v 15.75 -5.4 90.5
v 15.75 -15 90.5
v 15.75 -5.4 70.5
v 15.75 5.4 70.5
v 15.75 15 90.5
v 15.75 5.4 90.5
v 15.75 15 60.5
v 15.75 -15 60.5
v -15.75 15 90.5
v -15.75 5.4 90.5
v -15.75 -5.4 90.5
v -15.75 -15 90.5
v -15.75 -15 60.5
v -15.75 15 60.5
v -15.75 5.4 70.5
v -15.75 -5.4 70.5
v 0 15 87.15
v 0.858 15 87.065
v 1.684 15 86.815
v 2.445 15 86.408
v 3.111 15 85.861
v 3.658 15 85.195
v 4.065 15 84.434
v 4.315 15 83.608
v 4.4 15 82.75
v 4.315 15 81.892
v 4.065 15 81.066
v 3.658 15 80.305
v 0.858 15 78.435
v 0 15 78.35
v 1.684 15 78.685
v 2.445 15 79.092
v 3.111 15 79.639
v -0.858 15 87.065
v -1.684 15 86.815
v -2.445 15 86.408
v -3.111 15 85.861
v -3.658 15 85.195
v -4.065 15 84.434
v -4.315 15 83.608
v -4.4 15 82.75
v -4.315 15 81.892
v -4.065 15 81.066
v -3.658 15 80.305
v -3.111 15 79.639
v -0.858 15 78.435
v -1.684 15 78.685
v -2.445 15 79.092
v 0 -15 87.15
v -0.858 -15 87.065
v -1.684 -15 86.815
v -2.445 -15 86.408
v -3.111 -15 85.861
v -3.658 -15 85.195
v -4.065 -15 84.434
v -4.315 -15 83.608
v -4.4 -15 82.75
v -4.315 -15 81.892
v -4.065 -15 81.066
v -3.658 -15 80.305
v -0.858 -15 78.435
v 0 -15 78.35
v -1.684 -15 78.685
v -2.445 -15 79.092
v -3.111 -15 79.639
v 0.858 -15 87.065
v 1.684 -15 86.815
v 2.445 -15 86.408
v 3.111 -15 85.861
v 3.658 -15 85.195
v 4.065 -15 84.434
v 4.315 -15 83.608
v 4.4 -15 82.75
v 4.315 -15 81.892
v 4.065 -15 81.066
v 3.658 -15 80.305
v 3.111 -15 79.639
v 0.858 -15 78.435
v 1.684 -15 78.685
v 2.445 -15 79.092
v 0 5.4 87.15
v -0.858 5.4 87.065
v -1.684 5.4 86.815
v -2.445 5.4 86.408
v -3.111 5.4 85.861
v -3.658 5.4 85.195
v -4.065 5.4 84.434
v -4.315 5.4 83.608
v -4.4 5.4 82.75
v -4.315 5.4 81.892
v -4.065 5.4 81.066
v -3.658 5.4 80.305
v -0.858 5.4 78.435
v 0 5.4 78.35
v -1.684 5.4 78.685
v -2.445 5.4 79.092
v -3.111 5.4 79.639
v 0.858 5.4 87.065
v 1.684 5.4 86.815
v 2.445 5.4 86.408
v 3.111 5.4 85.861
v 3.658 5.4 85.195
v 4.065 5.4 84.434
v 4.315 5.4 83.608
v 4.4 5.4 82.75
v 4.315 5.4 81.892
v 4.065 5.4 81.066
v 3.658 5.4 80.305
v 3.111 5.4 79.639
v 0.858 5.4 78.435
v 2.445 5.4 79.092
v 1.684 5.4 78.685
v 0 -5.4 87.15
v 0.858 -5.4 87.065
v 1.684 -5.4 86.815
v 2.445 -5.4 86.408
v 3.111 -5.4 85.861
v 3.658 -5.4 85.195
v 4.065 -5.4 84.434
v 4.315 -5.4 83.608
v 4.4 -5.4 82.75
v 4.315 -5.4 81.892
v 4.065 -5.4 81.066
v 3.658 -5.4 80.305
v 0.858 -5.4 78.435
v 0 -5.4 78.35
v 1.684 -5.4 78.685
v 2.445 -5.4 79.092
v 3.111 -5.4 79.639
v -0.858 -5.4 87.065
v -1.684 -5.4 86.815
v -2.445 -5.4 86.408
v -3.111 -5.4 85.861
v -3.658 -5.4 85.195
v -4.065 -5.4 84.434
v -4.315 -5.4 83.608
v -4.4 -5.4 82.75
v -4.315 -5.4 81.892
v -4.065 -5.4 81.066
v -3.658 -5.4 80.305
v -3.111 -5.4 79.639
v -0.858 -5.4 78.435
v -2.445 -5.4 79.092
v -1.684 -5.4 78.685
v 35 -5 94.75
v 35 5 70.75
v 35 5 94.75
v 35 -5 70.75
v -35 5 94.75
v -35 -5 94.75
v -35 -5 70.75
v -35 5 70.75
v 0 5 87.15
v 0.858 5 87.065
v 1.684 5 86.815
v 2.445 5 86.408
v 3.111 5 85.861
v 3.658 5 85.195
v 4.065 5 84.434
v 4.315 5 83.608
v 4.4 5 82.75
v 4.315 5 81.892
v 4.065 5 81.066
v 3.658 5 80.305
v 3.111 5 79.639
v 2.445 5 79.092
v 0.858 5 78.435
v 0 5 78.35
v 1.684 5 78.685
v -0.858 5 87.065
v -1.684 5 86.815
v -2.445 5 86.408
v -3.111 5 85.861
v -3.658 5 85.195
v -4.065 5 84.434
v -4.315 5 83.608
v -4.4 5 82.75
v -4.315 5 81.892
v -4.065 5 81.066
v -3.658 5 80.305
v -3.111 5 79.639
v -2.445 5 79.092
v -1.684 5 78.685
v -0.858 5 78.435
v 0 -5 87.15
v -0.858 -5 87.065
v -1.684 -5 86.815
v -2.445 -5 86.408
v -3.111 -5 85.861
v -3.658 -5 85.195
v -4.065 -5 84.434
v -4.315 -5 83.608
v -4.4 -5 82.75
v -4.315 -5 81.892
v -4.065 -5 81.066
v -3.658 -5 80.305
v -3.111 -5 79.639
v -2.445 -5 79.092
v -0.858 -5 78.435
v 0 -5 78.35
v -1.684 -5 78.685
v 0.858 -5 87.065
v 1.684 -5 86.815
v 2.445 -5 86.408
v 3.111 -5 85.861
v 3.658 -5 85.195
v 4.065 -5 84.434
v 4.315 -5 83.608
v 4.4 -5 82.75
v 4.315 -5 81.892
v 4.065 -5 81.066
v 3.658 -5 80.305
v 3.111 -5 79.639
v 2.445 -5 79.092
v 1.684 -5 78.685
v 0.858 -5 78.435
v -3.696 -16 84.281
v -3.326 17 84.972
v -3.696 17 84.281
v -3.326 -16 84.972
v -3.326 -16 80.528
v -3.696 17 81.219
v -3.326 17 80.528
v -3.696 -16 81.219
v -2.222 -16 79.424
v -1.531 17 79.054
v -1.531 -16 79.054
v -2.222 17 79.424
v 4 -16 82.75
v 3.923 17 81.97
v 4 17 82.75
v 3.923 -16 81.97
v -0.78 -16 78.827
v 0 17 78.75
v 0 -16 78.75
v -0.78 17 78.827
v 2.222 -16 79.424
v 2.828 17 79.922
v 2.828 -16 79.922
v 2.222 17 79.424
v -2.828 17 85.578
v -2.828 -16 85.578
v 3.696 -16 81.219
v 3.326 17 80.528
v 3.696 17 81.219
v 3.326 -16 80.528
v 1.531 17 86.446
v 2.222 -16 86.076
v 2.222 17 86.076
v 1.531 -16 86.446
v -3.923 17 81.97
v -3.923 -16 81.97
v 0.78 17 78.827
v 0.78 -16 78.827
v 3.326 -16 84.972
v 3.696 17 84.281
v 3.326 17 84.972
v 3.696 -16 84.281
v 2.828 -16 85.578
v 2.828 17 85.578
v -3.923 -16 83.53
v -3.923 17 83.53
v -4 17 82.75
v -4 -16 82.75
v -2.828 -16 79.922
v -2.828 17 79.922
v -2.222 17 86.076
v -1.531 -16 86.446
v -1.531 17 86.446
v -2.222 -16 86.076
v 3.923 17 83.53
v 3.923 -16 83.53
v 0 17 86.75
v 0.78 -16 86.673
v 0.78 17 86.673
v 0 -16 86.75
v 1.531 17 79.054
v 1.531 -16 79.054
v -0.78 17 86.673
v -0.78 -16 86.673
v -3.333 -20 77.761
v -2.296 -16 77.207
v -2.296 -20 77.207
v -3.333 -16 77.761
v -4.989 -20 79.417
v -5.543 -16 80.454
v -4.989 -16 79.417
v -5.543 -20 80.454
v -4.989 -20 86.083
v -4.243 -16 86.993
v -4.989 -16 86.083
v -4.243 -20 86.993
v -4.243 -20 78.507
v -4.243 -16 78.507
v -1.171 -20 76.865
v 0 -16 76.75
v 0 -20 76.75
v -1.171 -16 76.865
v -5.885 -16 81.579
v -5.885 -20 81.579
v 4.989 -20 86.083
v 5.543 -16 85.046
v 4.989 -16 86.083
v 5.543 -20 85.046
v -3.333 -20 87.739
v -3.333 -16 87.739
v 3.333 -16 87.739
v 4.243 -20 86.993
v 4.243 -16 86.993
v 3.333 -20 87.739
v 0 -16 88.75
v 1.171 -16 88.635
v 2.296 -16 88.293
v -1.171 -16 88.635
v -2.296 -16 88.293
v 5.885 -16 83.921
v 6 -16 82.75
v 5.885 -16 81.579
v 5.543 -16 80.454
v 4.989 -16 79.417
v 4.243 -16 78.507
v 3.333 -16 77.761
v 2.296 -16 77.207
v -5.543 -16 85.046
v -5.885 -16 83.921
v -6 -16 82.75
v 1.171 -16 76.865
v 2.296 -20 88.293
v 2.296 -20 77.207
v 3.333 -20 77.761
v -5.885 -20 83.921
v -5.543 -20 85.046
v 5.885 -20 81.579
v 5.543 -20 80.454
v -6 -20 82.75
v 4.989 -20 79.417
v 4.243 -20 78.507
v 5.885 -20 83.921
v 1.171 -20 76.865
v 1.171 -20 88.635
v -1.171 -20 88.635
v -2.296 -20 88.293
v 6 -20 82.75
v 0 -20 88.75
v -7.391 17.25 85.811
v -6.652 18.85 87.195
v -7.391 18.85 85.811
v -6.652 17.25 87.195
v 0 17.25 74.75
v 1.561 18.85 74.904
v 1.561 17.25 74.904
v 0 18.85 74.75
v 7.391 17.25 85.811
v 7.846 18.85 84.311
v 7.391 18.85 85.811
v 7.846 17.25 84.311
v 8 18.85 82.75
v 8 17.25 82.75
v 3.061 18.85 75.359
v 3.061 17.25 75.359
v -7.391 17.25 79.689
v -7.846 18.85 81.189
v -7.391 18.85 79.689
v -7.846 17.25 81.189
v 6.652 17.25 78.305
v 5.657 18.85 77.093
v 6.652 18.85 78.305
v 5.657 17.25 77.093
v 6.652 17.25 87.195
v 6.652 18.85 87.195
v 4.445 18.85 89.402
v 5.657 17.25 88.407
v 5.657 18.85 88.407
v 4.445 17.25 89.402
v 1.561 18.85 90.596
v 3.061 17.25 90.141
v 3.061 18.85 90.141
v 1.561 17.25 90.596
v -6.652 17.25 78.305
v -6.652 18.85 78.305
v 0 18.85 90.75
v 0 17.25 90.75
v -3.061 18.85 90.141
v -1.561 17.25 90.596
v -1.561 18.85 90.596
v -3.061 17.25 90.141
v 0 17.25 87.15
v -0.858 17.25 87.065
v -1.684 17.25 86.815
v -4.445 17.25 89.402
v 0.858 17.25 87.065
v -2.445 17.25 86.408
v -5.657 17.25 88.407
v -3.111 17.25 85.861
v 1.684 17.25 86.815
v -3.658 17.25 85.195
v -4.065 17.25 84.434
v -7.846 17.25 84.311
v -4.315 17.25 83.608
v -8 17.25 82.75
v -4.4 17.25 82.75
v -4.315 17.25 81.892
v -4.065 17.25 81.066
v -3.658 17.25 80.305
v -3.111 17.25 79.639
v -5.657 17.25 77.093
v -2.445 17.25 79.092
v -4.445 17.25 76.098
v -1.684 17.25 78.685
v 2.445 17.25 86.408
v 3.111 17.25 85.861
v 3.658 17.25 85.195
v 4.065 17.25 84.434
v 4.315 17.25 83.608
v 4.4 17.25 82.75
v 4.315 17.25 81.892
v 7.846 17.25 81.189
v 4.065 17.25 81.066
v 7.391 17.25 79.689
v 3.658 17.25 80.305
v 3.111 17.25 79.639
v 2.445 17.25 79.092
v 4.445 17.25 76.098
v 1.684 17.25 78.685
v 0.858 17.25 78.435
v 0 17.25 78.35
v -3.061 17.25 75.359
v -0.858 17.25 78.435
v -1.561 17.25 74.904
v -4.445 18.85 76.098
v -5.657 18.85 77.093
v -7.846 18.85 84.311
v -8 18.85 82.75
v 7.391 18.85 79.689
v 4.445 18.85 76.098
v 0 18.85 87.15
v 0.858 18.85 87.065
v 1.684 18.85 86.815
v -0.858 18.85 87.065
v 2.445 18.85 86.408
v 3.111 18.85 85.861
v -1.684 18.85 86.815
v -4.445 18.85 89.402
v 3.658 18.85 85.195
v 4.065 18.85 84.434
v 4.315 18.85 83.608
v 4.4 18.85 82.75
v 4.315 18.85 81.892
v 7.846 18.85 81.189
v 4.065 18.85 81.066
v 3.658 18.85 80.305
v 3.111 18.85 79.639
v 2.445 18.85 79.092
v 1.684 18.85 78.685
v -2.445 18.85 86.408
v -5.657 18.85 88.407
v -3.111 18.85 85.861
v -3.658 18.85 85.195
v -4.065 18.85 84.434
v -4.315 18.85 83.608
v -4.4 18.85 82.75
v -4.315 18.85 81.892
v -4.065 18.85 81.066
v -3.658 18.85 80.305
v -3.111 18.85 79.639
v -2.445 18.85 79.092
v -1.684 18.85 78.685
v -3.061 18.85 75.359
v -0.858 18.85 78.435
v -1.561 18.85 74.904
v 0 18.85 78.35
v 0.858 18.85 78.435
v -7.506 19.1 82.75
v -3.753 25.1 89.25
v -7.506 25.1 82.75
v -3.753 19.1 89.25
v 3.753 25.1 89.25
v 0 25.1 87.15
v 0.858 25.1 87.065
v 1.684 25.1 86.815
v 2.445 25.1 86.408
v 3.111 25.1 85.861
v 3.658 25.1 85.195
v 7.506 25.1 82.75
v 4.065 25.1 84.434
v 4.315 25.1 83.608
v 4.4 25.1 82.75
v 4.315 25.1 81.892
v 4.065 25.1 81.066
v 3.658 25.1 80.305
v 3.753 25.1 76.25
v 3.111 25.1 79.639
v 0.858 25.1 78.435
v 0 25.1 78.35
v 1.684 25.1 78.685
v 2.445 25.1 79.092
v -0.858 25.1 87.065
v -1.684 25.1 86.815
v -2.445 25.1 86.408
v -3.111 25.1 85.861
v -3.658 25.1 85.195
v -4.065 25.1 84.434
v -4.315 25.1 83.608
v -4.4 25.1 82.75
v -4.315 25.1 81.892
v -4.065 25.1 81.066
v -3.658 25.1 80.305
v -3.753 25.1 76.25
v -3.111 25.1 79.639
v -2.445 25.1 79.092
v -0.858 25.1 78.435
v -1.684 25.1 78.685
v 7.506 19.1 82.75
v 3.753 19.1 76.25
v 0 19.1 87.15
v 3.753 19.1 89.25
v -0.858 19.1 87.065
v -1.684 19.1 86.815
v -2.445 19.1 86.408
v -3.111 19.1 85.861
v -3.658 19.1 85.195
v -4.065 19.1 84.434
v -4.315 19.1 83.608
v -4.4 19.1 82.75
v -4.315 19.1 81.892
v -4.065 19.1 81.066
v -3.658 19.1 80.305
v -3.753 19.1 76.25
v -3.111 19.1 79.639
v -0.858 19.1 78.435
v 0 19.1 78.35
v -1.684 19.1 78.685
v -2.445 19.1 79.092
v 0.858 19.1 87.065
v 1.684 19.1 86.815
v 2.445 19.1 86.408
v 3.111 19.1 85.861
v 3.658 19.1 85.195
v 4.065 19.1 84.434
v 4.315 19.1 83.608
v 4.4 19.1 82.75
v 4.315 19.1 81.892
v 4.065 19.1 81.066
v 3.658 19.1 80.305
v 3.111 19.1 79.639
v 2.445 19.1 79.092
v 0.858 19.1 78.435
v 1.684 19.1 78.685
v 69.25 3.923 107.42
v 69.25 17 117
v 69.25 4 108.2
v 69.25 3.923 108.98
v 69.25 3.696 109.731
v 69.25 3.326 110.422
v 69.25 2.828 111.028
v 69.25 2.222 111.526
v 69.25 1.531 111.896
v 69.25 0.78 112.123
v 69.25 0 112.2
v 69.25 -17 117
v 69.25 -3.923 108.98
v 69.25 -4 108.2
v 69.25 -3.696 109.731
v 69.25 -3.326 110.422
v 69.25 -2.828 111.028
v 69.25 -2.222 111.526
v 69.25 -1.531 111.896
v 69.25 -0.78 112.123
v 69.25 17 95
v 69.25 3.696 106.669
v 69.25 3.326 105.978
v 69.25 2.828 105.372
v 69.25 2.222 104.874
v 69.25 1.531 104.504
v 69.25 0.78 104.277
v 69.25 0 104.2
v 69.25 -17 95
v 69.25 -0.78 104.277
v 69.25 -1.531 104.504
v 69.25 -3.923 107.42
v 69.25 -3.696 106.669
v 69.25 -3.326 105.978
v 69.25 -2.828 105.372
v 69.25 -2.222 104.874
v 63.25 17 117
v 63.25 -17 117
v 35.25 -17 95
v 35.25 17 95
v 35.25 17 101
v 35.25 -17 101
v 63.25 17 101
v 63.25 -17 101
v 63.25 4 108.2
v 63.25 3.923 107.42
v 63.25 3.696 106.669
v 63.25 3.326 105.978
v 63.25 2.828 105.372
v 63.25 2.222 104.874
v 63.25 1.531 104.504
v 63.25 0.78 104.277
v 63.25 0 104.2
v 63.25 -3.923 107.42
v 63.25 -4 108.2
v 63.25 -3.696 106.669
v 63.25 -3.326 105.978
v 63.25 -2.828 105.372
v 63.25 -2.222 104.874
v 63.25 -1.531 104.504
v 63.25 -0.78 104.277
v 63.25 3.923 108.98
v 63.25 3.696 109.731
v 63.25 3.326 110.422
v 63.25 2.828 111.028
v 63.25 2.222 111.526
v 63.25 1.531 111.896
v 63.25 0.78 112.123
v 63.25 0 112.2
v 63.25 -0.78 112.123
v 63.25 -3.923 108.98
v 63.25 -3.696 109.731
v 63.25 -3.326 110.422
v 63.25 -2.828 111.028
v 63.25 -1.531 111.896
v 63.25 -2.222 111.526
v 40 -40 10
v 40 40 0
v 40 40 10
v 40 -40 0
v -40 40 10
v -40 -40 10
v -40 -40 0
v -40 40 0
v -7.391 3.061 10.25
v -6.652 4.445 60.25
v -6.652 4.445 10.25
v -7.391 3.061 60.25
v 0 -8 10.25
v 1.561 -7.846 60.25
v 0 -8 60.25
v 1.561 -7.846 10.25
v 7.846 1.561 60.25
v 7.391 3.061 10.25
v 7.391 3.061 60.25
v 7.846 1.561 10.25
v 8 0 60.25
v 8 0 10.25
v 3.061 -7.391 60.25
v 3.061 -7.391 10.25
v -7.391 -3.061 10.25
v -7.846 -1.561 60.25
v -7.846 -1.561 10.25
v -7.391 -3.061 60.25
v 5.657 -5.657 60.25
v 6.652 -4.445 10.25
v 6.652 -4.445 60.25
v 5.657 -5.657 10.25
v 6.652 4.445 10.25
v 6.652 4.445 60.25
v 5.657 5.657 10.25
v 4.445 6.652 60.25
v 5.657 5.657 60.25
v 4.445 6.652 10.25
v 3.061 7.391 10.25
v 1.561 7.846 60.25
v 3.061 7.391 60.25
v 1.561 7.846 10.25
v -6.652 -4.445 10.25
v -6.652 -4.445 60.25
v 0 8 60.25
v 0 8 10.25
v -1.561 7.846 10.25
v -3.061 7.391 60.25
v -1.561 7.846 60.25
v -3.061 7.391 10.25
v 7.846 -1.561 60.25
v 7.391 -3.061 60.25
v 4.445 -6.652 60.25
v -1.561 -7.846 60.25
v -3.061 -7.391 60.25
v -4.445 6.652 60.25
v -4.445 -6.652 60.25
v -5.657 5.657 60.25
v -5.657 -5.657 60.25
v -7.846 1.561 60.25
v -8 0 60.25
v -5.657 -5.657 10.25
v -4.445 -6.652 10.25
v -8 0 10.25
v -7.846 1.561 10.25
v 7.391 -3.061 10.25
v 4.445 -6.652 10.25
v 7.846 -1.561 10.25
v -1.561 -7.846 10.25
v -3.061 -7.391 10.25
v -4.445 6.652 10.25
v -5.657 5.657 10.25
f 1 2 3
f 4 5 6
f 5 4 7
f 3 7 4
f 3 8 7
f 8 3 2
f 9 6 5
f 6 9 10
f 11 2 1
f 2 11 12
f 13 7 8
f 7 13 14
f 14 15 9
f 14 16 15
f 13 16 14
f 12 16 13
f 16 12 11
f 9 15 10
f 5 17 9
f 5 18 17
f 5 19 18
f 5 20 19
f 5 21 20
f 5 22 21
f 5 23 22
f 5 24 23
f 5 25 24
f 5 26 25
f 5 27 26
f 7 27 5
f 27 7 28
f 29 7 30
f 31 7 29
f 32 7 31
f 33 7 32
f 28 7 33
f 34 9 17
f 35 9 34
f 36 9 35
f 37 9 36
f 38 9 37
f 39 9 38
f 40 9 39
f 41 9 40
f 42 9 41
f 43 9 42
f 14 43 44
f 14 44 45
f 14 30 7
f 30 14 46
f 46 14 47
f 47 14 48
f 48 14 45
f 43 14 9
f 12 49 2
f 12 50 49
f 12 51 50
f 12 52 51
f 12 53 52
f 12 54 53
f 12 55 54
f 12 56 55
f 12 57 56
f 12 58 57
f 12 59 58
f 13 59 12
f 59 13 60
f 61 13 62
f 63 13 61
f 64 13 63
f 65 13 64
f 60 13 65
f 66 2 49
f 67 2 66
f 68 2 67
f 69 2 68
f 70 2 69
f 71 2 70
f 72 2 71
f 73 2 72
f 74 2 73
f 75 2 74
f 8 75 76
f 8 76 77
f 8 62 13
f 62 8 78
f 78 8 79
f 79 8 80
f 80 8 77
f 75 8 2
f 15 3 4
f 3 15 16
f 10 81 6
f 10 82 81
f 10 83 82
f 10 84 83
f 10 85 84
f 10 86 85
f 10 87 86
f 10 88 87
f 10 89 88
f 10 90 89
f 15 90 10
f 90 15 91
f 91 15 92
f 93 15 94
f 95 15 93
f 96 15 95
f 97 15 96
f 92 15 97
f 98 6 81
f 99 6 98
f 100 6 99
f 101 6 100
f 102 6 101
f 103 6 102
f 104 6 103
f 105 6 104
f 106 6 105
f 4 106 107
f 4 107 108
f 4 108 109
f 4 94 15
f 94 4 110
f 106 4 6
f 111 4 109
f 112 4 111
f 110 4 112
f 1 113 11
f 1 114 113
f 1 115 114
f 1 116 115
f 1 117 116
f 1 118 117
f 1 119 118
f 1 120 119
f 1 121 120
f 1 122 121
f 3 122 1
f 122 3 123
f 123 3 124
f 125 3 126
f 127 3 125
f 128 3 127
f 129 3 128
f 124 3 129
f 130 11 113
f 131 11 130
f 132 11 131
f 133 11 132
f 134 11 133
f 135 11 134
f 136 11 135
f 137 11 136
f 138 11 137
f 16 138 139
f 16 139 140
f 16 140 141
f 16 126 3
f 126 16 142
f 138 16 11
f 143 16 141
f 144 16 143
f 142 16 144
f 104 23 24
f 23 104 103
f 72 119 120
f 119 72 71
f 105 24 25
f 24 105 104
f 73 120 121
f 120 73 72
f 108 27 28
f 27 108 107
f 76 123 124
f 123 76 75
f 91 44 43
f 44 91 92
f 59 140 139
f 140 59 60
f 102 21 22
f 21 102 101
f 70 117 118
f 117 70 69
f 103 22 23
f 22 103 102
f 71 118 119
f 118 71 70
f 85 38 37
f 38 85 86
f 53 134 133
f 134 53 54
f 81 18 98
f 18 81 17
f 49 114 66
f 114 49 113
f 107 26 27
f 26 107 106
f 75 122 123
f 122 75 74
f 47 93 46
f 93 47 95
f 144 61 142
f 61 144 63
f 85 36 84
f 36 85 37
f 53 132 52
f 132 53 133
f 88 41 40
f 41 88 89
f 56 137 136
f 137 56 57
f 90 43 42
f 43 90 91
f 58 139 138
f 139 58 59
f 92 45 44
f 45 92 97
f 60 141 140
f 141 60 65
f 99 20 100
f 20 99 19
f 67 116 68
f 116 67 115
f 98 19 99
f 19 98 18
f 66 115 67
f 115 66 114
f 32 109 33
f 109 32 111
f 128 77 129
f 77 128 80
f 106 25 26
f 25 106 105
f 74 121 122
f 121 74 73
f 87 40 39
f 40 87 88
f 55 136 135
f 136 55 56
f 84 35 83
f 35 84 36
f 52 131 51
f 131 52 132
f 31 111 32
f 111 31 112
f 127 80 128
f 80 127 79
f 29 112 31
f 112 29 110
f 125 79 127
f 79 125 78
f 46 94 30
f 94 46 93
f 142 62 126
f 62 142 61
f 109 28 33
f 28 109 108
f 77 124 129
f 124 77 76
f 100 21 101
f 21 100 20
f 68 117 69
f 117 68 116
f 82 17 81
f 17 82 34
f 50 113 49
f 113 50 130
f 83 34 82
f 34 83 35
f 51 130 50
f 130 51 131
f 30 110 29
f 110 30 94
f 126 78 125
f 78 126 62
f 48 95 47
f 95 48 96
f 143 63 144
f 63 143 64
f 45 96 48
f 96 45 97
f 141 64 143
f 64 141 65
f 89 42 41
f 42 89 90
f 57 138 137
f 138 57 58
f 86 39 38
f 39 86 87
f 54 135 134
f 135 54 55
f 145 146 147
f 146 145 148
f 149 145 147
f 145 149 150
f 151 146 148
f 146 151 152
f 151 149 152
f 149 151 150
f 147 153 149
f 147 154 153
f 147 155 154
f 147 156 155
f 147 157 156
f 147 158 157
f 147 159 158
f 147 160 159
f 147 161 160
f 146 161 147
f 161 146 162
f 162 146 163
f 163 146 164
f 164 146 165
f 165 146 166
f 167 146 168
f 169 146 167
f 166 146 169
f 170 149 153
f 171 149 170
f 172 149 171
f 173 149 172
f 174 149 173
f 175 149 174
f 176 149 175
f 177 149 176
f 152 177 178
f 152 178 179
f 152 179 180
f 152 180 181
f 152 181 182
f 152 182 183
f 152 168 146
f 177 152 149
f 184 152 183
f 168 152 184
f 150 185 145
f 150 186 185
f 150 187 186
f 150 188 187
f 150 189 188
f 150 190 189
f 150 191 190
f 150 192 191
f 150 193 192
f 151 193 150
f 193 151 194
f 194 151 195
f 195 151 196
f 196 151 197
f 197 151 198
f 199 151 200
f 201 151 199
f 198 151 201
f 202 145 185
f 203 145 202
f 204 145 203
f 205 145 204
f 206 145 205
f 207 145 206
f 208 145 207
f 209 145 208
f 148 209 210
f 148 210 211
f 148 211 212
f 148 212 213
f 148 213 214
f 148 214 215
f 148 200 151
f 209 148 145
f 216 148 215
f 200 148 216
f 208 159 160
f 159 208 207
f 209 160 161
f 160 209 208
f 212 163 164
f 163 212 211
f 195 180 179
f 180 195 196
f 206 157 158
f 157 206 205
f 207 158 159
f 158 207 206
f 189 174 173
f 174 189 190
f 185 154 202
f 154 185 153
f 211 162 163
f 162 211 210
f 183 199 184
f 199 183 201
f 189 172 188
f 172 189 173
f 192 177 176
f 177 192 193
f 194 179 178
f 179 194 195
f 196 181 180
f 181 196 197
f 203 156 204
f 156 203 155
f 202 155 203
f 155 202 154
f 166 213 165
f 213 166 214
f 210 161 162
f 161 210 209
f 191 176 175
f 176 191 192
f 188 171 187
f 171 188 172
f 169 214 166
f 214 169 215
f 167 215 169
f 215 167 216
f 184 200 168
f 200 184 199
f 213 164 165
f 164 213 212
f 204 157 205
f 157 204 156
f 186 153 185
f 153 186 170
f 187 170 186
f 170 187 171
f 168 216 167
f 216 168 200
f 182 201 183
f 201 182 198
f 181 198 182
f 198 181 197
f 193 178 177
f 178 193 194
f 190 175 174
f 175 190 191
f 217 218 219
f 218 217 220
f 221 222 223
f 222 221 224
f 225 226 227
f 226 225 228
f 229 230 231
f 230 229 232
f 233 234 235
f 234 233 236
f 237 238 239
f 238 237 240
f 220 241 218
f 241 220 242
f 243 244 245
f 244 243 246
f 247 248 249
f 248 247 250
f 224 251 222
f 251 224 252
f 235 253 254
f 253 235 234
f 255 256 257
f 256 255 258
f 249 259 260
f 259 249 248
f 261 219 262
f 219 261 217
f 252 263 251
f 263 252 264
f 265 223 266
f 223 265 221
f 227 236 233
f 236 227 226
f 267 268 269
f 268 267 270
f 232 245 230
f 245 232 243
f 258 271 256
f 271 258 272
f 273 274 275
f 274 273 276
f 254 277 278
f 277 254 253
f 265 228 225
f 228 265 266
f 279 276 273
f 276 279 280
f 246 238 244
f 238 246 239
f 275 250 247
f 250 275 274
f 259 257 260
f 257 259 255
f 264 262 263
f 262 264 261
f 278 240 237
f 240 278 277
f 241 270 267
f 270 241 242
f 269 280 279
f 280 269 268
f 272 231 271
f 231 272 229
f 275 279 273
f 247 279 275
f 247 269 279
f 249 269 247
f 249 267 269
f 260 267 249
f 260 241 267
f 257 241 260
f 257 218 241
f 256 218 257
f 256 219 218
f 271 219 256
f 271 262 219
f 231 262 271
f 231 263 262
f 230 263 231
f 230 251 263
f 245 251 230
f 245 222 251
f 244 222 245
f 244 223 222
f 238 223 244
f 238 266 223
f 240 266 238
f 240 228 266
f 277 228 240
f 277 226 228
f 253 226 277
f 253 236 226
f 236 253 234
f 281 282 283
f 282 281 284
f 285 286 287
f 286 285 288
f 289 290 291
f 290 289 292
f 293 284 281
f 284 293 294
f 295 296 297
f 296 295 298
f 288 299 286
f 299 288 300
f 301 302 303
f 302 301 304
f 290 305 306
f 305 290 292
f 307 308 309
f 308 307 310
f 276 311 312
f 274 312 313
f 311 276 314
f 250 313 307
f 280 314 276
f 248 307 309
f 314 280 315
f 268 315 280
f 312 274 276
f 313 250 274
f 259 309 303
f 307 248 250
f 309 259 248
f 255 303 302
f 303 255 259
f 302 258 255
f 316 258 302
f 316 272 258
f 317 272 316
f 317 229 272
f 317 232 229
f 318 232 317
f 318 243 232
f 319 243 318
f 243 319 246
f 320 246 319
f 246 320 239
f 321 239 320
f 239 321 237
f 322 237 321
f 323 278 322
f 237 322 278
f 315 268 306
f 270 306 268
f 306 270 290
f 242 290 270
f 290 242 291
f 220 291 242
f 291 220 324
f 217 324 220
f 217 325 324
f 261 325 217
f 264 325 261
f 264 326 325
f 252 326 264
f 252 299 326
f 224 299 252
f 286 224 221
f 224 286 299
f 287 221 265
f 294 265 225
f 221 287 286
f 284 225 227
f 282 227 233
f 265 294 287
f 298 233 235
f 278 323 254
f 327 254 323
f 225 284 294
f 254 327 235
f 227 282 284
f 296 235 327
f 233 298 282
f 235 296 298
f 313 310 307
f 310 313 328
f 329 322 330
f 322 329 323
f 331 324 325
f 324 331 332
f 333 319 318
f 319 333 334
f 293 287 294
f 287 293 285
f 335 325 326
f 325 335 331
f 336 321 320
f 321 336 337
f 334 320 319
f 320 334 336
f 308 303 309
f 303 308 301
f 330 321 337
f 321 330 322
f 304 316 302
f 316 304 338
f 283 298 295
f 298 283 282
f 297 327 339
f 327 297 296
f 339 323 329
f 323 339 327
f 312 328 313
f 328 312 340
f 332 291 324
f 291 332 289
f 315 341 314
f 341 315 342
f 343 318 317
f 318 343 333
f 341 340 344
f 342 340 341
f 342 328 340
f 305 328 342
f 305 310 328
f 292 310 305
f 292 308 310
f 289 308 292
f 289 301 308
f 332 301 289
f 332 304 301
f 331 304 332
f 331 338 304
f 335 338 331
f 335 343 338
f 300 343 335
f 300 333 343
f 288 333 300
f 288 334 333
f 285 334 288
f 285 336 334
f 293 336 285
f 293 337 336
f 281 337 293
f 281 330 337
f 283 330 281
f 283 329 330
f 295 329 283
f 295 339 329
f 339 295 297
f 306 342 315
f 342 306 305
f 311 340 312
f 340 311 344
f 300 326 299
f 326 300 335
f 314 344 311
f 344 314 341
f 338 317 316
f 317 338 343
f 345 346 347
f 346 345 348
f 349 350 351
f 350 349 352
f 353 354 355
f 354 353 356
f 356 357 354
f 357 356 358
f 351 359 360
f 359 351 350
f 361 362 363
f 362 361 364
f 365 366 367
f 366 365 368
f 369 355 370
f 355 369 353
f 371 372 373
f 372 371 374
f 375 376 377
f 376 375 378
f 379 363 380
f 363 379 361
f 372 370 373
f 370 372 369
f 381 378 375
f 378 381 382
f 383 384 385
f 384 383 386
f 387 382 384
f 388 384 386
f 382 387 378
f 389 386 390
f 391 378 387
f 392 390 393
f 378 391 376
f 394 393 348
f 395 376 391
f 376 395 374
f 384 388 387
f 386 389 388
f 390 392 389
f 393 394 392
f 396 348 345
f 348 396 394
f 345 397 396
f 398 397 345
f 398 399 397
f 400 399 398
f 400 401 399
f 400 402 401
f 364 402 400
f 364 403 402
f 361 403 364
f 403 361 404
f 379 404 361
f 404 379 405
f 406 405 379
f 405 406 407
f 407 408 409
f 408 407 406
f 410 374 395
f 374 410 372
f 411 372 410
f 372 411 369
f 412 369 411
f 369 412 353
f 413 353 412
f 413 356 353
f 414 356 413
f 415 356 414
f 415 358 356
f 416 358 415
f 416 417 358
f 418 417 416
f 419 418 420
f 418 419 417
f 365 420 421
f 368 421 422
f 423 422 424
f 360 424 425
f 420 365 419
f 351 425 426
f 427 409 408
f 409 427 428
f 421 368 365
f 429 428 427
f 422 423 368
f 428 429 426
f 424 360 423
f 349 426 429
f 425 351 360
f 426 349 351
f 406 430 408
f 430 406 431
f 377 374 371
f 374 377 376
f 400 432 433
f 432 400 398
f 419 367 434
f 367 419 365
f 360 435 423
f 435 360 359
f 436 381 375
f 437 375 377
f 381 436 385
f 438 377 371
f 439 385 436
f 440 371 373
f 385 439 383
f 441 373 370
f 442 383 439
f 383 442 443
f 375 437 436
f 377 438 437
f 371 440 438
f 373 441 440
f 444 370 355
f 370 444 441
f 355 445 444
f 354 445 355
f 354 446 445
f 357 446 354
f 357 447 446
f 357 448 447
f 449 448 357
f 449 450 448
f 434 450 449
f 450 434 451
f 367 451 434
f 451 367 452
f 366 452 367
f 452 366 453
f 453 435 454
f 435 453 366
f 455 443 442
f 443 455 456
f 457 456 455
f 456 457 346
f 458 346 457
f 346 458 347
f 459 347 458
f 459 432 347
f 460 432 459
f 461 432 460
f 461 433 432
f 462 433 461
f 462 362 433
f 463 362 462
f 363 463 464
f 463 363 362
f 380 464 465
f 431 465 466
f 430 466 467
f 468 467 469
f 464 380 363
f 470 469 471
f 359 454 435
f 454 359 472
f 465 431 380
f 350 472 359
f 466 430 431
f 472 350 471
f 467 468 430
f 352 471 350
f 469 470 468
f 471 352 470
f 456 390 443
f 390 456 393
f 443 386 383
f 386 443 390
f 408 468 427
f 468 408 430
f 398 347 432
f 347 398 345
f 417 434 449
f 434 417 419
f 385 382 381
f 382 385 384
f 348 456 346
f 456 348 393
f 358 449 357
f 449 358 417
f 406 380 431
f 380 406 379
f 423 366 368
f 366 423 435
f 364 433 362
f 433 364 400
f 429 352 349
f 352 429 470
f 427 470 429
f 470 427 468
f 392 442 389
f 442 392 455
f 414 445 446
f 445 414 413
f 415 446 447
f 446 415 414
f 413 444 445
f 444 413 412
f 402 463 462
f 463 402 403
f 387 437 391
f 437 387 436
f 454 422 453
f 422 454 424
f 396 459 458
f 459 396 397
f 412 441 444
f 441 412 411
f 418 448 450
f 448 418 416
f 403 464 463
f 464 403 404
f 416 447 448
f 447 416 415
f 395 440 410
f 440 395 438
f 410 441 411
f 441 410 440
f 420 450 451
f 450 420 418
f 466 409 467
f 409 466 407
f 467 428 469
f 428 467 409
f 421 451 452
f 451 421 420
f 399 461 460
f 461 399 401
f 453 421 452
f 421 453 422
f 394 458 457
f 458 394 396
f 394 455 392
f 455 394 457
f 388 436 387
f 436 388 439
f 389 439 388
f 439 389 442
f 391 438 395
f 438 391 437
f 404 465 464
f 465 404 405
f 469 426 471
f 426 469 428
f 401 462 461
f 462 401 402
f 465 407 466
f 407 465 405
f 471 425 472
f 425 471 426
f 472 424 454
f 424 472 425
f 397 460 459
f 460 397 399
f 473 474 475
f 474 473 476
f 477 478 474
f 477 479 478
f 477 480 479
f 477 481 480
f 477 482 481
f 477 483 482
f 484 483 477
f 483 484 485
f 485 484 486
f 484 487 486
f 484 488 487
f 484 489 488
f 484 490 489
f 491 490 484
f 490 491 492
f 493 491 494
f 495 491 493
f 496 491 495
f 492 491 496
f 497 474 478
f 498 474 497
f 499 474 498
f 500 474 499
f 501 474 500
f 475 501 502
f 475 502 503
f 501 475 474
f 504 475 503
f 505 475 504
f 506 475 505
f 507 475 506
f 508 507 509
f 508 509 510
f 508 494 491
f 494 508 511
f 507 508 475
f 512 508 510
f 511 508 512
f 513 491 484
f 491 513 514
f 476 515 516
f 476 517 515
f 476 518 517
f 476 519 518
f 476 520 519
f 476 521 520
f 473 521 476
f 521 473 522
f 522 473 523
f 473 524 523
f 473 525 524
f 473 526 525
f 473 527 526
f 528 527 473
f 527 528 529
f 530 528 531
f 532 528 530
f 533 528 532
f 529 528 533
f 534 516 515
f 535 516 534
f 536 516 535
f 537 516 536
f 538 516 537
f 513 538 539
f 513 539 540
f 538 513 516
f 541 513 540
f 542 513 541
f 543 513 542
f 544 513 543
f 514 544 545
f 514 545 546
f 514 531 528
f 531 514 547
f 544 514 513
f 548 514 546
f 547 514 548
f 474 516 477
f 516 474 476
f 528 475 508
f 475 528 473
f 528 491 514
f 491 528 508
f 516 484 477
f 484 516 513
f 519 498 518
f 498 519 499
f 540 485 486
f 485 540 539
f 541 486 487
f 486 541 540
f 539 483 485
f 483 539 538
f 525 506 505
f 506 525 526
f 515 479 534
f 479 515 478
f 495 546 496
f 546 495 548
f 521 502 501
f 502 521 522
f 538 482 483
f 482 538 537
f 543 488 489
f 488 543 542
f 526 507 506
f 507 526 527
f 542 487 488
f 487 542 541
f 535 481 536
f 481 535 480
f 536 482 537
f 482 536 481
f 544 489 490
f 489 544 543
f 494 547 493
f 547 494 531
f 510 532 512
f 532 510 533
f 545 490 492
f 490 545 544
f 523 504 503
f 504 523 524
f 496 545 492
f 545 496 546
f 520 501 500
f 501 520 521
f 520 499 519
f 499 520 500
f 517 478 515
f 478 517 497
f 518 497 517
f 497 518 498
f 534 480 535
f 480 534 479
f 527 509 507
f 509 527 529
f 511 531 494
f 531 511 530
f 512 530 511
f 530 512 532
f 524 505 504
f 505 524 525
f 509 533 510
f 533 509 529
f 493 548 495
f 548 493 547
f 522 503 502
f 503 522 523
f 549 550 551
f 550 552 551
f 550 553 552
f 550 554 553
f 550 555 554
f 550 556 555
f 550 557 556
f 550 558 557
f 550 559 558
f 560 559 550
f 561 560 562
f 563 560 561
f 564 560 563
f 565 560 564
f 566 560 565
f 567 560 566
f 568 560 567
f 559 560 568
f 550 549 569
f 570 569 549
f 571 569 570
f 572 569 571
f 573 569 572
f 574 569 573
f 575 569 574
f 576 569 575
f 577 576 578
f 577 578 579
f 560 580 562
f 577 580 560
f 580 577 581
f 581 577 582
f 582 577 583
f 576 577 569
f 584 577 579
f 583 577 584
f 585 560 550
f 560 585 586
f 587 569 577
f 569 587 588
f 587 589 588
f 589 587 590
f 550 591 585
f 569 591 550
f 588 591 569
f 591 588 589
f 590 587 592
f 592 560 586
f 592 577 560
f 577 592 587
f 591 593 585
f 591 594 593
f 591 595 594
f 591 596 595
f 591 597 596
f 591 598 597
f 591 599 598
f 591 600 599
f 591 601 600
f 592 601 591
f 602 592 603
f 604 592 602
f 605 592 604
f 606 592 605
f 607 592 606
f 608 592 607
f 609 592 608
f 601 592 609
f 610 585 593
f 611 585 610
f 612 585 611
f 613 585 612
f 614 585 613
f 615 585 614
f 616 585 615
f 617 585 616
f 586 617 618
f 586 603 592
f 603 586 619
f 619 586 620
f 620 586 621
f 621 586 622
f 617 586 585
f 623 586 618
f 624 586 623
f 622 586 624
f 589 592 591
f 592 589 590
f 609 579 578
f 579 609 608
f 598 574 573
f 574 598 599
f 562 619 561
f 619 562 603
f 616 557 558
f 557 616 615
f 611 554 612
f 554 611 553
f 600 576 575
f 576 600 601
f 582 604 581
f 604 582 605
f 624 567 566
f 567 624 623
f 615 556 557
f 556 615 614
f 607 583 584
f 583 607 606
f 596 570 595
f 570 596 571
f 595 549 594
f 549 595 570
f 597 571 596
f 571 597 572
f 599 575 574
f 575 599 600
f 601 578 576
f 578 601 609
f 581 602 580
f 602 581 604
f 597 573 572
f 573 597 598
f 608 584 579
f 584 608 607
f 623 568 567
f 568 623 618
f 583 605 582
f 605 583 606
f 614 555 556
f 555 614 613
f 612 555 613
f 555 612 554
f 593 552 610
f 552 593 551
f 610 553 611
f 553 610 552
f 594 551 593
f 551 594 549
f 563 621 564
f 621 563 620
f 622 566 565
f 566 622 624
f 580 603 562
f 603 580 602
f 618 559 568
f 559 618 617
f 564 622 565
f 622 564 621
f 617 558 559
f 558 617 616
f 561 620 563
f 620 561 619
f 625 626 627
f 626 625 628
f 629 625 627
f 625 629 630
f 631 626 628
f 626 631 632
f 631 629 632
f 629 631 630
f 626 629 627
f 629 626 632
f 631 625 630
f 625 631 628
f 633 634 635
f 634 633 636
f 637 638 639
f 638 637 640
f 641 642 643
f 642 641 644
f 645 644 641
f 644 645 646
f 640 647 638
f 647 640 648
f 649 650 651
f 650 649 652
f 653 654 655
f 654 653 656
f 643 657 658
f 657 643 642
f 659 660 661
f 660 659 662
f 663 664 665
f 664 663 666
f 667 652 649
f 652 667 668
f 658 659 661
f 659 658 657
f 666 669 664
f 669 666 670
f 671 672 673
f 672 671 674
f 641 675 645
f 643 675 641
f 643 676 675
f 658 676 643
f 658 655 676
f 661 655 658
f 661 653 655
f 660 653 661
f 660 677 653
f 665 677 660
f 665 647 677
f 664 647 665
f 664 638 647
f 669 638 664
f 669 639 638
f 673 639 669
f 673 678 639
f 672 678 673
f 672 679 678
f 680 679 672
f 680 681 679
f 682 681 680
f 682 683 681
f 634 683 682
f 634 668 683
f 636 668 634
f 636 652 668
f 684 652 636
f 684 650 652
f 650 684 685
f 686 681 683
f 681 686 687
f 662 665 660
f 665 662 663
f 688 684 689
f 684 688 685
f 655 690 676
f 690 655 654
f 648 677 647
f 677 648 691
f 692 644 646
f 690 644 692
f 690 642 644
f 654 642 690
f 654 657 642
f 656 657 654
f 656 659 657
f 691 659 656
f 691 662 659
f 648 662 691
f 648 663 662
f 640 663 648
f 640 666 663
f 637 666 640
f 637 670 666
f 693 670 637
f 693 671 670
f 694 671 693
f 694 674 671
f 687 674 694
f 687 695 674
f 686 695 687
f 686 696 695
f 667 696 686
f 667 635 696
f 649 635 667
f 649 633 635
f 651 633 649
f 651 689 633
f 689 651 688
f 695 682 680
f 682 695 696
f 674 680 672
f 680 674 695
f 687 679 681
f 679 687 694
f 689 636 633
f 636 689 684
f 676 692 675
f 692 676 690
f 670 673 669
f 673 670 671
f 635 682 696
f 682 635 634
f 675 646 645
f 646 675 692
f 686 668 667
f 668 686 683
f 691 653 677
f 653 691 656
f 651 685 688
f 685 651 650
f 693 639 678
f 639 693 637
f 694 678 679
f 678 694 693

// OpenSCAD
$fn = 32;

// ------------------------------------------------------------------------
// Lamp arm: column d16 x 50 mm, arm 70 mm
// Every part is its own module, assembly() places every instance.
// ------------------------------------------------------------------------

// --- part 1 ---
module lamp_base() {
  difference() {
    translate([-40, -40, 0]) cube([80, 80, 10]);
  }
}

// --- part 2 ---
module lamp_column() {
  cylinder(h = 50, d = 16);
}

// --- part 3 ---
module head_fork() {
  difference() {
    translate([-15.75, -15, 0]) cube([31.5, 30, 30]);
    translate([-16.75, -5.4, 10]) cube([33.5, 10.8, 21]);
    translate([0, 0, 22.25]) rotate([90, 0, 0]) cylinder(h = 32, d = 8.8, center = true);
  }
}

// --- part 4 ---
module lamp_arm() {
  difference() {
    translate([-35, -5, 0]) cube([70, 10, 24]);
    translate([0, 0, 12]) rotate([90, 0, 0]) cylinder(h = 12, d = 8.8, center = true);
  }
}

// --- part 5 ---
module arm_pin() {
  rotate([0, 90, 0]) cylinder(h = 34, d = 8, center = true);
  translate([-20, 0, 0]) rotate([0, 90, 0]) cylinder(h = 4, d = 12);
}

// --- part 6 ---
module arm_washer() {
  difference() {
      translate([0, 0, 0]) cylinder(h = 1.6, d = 16);
      translate([0, 0, -1]) cylinder(h = 3.6, d = 8.8);
    }
}

// --- part 7 ---
module arm_nut() {
  difference() {
    linear_extrude(height = 6) polygon(points = [[7.506, 0], [3.753, 6.5], [-3.753, 6.5], [-7.506, 0], [-3.753, -6.5], [3.753, -6.5]]);
    translate([0, 0, -1]) cylinder(h = 8, d = 8.8);
  }
}

// --- part 8 ---
module shade_bracket() {
  difference() {
    translate([-17, -17, 0]) cube([34, 34, 22]);
    translate([-18, -18, 6]) cube([29, 36, 17]);
    translate([14, 0, 13.2]) rotate([0, 90, 0]) cylinder(h = 8, d = 8, center = true);
  }
}

// --- assembly ---
module assembly() {
  color([0.80, 0.24, 0.20]) translate([0, 0, 0]) rotate([0, 0, 0]) lamp_base();
  color([0.20, 0.45, 0.75]) translate([0, 0, 10.25]) rotate([0, 0, 0]) lamp_column();
  color([0.25, 0.62, 0.32]) translate([0, 0, 60.5]) rotate([0, 0, 0]) head_fork();
  color([0.92, 0.70, 0.18]) translate([0, 0, 70.75]) rotate([0, 0, 0]) lamp_arm();
  color([0.58, 0.35, 0.70]) translate([0, 0, 82.75]) rotate([0, 0, 90]) arm_pin();
  color([0.16, 0.66, 0.66]) translate([0, 18.85, 82.75]) rotate([90, 0, 0]) arm_washer();
  color([0.85, 0.48, 0.18]) translate([0, 25.1, 82.75]) rotate([90, 0, 0]) arm_nut();
  color([0.55, 0.60, 0.65]) translate([52.25, 0, 95]) rotate([0, 0, 0]) shade_bracket();
}

assembly();
